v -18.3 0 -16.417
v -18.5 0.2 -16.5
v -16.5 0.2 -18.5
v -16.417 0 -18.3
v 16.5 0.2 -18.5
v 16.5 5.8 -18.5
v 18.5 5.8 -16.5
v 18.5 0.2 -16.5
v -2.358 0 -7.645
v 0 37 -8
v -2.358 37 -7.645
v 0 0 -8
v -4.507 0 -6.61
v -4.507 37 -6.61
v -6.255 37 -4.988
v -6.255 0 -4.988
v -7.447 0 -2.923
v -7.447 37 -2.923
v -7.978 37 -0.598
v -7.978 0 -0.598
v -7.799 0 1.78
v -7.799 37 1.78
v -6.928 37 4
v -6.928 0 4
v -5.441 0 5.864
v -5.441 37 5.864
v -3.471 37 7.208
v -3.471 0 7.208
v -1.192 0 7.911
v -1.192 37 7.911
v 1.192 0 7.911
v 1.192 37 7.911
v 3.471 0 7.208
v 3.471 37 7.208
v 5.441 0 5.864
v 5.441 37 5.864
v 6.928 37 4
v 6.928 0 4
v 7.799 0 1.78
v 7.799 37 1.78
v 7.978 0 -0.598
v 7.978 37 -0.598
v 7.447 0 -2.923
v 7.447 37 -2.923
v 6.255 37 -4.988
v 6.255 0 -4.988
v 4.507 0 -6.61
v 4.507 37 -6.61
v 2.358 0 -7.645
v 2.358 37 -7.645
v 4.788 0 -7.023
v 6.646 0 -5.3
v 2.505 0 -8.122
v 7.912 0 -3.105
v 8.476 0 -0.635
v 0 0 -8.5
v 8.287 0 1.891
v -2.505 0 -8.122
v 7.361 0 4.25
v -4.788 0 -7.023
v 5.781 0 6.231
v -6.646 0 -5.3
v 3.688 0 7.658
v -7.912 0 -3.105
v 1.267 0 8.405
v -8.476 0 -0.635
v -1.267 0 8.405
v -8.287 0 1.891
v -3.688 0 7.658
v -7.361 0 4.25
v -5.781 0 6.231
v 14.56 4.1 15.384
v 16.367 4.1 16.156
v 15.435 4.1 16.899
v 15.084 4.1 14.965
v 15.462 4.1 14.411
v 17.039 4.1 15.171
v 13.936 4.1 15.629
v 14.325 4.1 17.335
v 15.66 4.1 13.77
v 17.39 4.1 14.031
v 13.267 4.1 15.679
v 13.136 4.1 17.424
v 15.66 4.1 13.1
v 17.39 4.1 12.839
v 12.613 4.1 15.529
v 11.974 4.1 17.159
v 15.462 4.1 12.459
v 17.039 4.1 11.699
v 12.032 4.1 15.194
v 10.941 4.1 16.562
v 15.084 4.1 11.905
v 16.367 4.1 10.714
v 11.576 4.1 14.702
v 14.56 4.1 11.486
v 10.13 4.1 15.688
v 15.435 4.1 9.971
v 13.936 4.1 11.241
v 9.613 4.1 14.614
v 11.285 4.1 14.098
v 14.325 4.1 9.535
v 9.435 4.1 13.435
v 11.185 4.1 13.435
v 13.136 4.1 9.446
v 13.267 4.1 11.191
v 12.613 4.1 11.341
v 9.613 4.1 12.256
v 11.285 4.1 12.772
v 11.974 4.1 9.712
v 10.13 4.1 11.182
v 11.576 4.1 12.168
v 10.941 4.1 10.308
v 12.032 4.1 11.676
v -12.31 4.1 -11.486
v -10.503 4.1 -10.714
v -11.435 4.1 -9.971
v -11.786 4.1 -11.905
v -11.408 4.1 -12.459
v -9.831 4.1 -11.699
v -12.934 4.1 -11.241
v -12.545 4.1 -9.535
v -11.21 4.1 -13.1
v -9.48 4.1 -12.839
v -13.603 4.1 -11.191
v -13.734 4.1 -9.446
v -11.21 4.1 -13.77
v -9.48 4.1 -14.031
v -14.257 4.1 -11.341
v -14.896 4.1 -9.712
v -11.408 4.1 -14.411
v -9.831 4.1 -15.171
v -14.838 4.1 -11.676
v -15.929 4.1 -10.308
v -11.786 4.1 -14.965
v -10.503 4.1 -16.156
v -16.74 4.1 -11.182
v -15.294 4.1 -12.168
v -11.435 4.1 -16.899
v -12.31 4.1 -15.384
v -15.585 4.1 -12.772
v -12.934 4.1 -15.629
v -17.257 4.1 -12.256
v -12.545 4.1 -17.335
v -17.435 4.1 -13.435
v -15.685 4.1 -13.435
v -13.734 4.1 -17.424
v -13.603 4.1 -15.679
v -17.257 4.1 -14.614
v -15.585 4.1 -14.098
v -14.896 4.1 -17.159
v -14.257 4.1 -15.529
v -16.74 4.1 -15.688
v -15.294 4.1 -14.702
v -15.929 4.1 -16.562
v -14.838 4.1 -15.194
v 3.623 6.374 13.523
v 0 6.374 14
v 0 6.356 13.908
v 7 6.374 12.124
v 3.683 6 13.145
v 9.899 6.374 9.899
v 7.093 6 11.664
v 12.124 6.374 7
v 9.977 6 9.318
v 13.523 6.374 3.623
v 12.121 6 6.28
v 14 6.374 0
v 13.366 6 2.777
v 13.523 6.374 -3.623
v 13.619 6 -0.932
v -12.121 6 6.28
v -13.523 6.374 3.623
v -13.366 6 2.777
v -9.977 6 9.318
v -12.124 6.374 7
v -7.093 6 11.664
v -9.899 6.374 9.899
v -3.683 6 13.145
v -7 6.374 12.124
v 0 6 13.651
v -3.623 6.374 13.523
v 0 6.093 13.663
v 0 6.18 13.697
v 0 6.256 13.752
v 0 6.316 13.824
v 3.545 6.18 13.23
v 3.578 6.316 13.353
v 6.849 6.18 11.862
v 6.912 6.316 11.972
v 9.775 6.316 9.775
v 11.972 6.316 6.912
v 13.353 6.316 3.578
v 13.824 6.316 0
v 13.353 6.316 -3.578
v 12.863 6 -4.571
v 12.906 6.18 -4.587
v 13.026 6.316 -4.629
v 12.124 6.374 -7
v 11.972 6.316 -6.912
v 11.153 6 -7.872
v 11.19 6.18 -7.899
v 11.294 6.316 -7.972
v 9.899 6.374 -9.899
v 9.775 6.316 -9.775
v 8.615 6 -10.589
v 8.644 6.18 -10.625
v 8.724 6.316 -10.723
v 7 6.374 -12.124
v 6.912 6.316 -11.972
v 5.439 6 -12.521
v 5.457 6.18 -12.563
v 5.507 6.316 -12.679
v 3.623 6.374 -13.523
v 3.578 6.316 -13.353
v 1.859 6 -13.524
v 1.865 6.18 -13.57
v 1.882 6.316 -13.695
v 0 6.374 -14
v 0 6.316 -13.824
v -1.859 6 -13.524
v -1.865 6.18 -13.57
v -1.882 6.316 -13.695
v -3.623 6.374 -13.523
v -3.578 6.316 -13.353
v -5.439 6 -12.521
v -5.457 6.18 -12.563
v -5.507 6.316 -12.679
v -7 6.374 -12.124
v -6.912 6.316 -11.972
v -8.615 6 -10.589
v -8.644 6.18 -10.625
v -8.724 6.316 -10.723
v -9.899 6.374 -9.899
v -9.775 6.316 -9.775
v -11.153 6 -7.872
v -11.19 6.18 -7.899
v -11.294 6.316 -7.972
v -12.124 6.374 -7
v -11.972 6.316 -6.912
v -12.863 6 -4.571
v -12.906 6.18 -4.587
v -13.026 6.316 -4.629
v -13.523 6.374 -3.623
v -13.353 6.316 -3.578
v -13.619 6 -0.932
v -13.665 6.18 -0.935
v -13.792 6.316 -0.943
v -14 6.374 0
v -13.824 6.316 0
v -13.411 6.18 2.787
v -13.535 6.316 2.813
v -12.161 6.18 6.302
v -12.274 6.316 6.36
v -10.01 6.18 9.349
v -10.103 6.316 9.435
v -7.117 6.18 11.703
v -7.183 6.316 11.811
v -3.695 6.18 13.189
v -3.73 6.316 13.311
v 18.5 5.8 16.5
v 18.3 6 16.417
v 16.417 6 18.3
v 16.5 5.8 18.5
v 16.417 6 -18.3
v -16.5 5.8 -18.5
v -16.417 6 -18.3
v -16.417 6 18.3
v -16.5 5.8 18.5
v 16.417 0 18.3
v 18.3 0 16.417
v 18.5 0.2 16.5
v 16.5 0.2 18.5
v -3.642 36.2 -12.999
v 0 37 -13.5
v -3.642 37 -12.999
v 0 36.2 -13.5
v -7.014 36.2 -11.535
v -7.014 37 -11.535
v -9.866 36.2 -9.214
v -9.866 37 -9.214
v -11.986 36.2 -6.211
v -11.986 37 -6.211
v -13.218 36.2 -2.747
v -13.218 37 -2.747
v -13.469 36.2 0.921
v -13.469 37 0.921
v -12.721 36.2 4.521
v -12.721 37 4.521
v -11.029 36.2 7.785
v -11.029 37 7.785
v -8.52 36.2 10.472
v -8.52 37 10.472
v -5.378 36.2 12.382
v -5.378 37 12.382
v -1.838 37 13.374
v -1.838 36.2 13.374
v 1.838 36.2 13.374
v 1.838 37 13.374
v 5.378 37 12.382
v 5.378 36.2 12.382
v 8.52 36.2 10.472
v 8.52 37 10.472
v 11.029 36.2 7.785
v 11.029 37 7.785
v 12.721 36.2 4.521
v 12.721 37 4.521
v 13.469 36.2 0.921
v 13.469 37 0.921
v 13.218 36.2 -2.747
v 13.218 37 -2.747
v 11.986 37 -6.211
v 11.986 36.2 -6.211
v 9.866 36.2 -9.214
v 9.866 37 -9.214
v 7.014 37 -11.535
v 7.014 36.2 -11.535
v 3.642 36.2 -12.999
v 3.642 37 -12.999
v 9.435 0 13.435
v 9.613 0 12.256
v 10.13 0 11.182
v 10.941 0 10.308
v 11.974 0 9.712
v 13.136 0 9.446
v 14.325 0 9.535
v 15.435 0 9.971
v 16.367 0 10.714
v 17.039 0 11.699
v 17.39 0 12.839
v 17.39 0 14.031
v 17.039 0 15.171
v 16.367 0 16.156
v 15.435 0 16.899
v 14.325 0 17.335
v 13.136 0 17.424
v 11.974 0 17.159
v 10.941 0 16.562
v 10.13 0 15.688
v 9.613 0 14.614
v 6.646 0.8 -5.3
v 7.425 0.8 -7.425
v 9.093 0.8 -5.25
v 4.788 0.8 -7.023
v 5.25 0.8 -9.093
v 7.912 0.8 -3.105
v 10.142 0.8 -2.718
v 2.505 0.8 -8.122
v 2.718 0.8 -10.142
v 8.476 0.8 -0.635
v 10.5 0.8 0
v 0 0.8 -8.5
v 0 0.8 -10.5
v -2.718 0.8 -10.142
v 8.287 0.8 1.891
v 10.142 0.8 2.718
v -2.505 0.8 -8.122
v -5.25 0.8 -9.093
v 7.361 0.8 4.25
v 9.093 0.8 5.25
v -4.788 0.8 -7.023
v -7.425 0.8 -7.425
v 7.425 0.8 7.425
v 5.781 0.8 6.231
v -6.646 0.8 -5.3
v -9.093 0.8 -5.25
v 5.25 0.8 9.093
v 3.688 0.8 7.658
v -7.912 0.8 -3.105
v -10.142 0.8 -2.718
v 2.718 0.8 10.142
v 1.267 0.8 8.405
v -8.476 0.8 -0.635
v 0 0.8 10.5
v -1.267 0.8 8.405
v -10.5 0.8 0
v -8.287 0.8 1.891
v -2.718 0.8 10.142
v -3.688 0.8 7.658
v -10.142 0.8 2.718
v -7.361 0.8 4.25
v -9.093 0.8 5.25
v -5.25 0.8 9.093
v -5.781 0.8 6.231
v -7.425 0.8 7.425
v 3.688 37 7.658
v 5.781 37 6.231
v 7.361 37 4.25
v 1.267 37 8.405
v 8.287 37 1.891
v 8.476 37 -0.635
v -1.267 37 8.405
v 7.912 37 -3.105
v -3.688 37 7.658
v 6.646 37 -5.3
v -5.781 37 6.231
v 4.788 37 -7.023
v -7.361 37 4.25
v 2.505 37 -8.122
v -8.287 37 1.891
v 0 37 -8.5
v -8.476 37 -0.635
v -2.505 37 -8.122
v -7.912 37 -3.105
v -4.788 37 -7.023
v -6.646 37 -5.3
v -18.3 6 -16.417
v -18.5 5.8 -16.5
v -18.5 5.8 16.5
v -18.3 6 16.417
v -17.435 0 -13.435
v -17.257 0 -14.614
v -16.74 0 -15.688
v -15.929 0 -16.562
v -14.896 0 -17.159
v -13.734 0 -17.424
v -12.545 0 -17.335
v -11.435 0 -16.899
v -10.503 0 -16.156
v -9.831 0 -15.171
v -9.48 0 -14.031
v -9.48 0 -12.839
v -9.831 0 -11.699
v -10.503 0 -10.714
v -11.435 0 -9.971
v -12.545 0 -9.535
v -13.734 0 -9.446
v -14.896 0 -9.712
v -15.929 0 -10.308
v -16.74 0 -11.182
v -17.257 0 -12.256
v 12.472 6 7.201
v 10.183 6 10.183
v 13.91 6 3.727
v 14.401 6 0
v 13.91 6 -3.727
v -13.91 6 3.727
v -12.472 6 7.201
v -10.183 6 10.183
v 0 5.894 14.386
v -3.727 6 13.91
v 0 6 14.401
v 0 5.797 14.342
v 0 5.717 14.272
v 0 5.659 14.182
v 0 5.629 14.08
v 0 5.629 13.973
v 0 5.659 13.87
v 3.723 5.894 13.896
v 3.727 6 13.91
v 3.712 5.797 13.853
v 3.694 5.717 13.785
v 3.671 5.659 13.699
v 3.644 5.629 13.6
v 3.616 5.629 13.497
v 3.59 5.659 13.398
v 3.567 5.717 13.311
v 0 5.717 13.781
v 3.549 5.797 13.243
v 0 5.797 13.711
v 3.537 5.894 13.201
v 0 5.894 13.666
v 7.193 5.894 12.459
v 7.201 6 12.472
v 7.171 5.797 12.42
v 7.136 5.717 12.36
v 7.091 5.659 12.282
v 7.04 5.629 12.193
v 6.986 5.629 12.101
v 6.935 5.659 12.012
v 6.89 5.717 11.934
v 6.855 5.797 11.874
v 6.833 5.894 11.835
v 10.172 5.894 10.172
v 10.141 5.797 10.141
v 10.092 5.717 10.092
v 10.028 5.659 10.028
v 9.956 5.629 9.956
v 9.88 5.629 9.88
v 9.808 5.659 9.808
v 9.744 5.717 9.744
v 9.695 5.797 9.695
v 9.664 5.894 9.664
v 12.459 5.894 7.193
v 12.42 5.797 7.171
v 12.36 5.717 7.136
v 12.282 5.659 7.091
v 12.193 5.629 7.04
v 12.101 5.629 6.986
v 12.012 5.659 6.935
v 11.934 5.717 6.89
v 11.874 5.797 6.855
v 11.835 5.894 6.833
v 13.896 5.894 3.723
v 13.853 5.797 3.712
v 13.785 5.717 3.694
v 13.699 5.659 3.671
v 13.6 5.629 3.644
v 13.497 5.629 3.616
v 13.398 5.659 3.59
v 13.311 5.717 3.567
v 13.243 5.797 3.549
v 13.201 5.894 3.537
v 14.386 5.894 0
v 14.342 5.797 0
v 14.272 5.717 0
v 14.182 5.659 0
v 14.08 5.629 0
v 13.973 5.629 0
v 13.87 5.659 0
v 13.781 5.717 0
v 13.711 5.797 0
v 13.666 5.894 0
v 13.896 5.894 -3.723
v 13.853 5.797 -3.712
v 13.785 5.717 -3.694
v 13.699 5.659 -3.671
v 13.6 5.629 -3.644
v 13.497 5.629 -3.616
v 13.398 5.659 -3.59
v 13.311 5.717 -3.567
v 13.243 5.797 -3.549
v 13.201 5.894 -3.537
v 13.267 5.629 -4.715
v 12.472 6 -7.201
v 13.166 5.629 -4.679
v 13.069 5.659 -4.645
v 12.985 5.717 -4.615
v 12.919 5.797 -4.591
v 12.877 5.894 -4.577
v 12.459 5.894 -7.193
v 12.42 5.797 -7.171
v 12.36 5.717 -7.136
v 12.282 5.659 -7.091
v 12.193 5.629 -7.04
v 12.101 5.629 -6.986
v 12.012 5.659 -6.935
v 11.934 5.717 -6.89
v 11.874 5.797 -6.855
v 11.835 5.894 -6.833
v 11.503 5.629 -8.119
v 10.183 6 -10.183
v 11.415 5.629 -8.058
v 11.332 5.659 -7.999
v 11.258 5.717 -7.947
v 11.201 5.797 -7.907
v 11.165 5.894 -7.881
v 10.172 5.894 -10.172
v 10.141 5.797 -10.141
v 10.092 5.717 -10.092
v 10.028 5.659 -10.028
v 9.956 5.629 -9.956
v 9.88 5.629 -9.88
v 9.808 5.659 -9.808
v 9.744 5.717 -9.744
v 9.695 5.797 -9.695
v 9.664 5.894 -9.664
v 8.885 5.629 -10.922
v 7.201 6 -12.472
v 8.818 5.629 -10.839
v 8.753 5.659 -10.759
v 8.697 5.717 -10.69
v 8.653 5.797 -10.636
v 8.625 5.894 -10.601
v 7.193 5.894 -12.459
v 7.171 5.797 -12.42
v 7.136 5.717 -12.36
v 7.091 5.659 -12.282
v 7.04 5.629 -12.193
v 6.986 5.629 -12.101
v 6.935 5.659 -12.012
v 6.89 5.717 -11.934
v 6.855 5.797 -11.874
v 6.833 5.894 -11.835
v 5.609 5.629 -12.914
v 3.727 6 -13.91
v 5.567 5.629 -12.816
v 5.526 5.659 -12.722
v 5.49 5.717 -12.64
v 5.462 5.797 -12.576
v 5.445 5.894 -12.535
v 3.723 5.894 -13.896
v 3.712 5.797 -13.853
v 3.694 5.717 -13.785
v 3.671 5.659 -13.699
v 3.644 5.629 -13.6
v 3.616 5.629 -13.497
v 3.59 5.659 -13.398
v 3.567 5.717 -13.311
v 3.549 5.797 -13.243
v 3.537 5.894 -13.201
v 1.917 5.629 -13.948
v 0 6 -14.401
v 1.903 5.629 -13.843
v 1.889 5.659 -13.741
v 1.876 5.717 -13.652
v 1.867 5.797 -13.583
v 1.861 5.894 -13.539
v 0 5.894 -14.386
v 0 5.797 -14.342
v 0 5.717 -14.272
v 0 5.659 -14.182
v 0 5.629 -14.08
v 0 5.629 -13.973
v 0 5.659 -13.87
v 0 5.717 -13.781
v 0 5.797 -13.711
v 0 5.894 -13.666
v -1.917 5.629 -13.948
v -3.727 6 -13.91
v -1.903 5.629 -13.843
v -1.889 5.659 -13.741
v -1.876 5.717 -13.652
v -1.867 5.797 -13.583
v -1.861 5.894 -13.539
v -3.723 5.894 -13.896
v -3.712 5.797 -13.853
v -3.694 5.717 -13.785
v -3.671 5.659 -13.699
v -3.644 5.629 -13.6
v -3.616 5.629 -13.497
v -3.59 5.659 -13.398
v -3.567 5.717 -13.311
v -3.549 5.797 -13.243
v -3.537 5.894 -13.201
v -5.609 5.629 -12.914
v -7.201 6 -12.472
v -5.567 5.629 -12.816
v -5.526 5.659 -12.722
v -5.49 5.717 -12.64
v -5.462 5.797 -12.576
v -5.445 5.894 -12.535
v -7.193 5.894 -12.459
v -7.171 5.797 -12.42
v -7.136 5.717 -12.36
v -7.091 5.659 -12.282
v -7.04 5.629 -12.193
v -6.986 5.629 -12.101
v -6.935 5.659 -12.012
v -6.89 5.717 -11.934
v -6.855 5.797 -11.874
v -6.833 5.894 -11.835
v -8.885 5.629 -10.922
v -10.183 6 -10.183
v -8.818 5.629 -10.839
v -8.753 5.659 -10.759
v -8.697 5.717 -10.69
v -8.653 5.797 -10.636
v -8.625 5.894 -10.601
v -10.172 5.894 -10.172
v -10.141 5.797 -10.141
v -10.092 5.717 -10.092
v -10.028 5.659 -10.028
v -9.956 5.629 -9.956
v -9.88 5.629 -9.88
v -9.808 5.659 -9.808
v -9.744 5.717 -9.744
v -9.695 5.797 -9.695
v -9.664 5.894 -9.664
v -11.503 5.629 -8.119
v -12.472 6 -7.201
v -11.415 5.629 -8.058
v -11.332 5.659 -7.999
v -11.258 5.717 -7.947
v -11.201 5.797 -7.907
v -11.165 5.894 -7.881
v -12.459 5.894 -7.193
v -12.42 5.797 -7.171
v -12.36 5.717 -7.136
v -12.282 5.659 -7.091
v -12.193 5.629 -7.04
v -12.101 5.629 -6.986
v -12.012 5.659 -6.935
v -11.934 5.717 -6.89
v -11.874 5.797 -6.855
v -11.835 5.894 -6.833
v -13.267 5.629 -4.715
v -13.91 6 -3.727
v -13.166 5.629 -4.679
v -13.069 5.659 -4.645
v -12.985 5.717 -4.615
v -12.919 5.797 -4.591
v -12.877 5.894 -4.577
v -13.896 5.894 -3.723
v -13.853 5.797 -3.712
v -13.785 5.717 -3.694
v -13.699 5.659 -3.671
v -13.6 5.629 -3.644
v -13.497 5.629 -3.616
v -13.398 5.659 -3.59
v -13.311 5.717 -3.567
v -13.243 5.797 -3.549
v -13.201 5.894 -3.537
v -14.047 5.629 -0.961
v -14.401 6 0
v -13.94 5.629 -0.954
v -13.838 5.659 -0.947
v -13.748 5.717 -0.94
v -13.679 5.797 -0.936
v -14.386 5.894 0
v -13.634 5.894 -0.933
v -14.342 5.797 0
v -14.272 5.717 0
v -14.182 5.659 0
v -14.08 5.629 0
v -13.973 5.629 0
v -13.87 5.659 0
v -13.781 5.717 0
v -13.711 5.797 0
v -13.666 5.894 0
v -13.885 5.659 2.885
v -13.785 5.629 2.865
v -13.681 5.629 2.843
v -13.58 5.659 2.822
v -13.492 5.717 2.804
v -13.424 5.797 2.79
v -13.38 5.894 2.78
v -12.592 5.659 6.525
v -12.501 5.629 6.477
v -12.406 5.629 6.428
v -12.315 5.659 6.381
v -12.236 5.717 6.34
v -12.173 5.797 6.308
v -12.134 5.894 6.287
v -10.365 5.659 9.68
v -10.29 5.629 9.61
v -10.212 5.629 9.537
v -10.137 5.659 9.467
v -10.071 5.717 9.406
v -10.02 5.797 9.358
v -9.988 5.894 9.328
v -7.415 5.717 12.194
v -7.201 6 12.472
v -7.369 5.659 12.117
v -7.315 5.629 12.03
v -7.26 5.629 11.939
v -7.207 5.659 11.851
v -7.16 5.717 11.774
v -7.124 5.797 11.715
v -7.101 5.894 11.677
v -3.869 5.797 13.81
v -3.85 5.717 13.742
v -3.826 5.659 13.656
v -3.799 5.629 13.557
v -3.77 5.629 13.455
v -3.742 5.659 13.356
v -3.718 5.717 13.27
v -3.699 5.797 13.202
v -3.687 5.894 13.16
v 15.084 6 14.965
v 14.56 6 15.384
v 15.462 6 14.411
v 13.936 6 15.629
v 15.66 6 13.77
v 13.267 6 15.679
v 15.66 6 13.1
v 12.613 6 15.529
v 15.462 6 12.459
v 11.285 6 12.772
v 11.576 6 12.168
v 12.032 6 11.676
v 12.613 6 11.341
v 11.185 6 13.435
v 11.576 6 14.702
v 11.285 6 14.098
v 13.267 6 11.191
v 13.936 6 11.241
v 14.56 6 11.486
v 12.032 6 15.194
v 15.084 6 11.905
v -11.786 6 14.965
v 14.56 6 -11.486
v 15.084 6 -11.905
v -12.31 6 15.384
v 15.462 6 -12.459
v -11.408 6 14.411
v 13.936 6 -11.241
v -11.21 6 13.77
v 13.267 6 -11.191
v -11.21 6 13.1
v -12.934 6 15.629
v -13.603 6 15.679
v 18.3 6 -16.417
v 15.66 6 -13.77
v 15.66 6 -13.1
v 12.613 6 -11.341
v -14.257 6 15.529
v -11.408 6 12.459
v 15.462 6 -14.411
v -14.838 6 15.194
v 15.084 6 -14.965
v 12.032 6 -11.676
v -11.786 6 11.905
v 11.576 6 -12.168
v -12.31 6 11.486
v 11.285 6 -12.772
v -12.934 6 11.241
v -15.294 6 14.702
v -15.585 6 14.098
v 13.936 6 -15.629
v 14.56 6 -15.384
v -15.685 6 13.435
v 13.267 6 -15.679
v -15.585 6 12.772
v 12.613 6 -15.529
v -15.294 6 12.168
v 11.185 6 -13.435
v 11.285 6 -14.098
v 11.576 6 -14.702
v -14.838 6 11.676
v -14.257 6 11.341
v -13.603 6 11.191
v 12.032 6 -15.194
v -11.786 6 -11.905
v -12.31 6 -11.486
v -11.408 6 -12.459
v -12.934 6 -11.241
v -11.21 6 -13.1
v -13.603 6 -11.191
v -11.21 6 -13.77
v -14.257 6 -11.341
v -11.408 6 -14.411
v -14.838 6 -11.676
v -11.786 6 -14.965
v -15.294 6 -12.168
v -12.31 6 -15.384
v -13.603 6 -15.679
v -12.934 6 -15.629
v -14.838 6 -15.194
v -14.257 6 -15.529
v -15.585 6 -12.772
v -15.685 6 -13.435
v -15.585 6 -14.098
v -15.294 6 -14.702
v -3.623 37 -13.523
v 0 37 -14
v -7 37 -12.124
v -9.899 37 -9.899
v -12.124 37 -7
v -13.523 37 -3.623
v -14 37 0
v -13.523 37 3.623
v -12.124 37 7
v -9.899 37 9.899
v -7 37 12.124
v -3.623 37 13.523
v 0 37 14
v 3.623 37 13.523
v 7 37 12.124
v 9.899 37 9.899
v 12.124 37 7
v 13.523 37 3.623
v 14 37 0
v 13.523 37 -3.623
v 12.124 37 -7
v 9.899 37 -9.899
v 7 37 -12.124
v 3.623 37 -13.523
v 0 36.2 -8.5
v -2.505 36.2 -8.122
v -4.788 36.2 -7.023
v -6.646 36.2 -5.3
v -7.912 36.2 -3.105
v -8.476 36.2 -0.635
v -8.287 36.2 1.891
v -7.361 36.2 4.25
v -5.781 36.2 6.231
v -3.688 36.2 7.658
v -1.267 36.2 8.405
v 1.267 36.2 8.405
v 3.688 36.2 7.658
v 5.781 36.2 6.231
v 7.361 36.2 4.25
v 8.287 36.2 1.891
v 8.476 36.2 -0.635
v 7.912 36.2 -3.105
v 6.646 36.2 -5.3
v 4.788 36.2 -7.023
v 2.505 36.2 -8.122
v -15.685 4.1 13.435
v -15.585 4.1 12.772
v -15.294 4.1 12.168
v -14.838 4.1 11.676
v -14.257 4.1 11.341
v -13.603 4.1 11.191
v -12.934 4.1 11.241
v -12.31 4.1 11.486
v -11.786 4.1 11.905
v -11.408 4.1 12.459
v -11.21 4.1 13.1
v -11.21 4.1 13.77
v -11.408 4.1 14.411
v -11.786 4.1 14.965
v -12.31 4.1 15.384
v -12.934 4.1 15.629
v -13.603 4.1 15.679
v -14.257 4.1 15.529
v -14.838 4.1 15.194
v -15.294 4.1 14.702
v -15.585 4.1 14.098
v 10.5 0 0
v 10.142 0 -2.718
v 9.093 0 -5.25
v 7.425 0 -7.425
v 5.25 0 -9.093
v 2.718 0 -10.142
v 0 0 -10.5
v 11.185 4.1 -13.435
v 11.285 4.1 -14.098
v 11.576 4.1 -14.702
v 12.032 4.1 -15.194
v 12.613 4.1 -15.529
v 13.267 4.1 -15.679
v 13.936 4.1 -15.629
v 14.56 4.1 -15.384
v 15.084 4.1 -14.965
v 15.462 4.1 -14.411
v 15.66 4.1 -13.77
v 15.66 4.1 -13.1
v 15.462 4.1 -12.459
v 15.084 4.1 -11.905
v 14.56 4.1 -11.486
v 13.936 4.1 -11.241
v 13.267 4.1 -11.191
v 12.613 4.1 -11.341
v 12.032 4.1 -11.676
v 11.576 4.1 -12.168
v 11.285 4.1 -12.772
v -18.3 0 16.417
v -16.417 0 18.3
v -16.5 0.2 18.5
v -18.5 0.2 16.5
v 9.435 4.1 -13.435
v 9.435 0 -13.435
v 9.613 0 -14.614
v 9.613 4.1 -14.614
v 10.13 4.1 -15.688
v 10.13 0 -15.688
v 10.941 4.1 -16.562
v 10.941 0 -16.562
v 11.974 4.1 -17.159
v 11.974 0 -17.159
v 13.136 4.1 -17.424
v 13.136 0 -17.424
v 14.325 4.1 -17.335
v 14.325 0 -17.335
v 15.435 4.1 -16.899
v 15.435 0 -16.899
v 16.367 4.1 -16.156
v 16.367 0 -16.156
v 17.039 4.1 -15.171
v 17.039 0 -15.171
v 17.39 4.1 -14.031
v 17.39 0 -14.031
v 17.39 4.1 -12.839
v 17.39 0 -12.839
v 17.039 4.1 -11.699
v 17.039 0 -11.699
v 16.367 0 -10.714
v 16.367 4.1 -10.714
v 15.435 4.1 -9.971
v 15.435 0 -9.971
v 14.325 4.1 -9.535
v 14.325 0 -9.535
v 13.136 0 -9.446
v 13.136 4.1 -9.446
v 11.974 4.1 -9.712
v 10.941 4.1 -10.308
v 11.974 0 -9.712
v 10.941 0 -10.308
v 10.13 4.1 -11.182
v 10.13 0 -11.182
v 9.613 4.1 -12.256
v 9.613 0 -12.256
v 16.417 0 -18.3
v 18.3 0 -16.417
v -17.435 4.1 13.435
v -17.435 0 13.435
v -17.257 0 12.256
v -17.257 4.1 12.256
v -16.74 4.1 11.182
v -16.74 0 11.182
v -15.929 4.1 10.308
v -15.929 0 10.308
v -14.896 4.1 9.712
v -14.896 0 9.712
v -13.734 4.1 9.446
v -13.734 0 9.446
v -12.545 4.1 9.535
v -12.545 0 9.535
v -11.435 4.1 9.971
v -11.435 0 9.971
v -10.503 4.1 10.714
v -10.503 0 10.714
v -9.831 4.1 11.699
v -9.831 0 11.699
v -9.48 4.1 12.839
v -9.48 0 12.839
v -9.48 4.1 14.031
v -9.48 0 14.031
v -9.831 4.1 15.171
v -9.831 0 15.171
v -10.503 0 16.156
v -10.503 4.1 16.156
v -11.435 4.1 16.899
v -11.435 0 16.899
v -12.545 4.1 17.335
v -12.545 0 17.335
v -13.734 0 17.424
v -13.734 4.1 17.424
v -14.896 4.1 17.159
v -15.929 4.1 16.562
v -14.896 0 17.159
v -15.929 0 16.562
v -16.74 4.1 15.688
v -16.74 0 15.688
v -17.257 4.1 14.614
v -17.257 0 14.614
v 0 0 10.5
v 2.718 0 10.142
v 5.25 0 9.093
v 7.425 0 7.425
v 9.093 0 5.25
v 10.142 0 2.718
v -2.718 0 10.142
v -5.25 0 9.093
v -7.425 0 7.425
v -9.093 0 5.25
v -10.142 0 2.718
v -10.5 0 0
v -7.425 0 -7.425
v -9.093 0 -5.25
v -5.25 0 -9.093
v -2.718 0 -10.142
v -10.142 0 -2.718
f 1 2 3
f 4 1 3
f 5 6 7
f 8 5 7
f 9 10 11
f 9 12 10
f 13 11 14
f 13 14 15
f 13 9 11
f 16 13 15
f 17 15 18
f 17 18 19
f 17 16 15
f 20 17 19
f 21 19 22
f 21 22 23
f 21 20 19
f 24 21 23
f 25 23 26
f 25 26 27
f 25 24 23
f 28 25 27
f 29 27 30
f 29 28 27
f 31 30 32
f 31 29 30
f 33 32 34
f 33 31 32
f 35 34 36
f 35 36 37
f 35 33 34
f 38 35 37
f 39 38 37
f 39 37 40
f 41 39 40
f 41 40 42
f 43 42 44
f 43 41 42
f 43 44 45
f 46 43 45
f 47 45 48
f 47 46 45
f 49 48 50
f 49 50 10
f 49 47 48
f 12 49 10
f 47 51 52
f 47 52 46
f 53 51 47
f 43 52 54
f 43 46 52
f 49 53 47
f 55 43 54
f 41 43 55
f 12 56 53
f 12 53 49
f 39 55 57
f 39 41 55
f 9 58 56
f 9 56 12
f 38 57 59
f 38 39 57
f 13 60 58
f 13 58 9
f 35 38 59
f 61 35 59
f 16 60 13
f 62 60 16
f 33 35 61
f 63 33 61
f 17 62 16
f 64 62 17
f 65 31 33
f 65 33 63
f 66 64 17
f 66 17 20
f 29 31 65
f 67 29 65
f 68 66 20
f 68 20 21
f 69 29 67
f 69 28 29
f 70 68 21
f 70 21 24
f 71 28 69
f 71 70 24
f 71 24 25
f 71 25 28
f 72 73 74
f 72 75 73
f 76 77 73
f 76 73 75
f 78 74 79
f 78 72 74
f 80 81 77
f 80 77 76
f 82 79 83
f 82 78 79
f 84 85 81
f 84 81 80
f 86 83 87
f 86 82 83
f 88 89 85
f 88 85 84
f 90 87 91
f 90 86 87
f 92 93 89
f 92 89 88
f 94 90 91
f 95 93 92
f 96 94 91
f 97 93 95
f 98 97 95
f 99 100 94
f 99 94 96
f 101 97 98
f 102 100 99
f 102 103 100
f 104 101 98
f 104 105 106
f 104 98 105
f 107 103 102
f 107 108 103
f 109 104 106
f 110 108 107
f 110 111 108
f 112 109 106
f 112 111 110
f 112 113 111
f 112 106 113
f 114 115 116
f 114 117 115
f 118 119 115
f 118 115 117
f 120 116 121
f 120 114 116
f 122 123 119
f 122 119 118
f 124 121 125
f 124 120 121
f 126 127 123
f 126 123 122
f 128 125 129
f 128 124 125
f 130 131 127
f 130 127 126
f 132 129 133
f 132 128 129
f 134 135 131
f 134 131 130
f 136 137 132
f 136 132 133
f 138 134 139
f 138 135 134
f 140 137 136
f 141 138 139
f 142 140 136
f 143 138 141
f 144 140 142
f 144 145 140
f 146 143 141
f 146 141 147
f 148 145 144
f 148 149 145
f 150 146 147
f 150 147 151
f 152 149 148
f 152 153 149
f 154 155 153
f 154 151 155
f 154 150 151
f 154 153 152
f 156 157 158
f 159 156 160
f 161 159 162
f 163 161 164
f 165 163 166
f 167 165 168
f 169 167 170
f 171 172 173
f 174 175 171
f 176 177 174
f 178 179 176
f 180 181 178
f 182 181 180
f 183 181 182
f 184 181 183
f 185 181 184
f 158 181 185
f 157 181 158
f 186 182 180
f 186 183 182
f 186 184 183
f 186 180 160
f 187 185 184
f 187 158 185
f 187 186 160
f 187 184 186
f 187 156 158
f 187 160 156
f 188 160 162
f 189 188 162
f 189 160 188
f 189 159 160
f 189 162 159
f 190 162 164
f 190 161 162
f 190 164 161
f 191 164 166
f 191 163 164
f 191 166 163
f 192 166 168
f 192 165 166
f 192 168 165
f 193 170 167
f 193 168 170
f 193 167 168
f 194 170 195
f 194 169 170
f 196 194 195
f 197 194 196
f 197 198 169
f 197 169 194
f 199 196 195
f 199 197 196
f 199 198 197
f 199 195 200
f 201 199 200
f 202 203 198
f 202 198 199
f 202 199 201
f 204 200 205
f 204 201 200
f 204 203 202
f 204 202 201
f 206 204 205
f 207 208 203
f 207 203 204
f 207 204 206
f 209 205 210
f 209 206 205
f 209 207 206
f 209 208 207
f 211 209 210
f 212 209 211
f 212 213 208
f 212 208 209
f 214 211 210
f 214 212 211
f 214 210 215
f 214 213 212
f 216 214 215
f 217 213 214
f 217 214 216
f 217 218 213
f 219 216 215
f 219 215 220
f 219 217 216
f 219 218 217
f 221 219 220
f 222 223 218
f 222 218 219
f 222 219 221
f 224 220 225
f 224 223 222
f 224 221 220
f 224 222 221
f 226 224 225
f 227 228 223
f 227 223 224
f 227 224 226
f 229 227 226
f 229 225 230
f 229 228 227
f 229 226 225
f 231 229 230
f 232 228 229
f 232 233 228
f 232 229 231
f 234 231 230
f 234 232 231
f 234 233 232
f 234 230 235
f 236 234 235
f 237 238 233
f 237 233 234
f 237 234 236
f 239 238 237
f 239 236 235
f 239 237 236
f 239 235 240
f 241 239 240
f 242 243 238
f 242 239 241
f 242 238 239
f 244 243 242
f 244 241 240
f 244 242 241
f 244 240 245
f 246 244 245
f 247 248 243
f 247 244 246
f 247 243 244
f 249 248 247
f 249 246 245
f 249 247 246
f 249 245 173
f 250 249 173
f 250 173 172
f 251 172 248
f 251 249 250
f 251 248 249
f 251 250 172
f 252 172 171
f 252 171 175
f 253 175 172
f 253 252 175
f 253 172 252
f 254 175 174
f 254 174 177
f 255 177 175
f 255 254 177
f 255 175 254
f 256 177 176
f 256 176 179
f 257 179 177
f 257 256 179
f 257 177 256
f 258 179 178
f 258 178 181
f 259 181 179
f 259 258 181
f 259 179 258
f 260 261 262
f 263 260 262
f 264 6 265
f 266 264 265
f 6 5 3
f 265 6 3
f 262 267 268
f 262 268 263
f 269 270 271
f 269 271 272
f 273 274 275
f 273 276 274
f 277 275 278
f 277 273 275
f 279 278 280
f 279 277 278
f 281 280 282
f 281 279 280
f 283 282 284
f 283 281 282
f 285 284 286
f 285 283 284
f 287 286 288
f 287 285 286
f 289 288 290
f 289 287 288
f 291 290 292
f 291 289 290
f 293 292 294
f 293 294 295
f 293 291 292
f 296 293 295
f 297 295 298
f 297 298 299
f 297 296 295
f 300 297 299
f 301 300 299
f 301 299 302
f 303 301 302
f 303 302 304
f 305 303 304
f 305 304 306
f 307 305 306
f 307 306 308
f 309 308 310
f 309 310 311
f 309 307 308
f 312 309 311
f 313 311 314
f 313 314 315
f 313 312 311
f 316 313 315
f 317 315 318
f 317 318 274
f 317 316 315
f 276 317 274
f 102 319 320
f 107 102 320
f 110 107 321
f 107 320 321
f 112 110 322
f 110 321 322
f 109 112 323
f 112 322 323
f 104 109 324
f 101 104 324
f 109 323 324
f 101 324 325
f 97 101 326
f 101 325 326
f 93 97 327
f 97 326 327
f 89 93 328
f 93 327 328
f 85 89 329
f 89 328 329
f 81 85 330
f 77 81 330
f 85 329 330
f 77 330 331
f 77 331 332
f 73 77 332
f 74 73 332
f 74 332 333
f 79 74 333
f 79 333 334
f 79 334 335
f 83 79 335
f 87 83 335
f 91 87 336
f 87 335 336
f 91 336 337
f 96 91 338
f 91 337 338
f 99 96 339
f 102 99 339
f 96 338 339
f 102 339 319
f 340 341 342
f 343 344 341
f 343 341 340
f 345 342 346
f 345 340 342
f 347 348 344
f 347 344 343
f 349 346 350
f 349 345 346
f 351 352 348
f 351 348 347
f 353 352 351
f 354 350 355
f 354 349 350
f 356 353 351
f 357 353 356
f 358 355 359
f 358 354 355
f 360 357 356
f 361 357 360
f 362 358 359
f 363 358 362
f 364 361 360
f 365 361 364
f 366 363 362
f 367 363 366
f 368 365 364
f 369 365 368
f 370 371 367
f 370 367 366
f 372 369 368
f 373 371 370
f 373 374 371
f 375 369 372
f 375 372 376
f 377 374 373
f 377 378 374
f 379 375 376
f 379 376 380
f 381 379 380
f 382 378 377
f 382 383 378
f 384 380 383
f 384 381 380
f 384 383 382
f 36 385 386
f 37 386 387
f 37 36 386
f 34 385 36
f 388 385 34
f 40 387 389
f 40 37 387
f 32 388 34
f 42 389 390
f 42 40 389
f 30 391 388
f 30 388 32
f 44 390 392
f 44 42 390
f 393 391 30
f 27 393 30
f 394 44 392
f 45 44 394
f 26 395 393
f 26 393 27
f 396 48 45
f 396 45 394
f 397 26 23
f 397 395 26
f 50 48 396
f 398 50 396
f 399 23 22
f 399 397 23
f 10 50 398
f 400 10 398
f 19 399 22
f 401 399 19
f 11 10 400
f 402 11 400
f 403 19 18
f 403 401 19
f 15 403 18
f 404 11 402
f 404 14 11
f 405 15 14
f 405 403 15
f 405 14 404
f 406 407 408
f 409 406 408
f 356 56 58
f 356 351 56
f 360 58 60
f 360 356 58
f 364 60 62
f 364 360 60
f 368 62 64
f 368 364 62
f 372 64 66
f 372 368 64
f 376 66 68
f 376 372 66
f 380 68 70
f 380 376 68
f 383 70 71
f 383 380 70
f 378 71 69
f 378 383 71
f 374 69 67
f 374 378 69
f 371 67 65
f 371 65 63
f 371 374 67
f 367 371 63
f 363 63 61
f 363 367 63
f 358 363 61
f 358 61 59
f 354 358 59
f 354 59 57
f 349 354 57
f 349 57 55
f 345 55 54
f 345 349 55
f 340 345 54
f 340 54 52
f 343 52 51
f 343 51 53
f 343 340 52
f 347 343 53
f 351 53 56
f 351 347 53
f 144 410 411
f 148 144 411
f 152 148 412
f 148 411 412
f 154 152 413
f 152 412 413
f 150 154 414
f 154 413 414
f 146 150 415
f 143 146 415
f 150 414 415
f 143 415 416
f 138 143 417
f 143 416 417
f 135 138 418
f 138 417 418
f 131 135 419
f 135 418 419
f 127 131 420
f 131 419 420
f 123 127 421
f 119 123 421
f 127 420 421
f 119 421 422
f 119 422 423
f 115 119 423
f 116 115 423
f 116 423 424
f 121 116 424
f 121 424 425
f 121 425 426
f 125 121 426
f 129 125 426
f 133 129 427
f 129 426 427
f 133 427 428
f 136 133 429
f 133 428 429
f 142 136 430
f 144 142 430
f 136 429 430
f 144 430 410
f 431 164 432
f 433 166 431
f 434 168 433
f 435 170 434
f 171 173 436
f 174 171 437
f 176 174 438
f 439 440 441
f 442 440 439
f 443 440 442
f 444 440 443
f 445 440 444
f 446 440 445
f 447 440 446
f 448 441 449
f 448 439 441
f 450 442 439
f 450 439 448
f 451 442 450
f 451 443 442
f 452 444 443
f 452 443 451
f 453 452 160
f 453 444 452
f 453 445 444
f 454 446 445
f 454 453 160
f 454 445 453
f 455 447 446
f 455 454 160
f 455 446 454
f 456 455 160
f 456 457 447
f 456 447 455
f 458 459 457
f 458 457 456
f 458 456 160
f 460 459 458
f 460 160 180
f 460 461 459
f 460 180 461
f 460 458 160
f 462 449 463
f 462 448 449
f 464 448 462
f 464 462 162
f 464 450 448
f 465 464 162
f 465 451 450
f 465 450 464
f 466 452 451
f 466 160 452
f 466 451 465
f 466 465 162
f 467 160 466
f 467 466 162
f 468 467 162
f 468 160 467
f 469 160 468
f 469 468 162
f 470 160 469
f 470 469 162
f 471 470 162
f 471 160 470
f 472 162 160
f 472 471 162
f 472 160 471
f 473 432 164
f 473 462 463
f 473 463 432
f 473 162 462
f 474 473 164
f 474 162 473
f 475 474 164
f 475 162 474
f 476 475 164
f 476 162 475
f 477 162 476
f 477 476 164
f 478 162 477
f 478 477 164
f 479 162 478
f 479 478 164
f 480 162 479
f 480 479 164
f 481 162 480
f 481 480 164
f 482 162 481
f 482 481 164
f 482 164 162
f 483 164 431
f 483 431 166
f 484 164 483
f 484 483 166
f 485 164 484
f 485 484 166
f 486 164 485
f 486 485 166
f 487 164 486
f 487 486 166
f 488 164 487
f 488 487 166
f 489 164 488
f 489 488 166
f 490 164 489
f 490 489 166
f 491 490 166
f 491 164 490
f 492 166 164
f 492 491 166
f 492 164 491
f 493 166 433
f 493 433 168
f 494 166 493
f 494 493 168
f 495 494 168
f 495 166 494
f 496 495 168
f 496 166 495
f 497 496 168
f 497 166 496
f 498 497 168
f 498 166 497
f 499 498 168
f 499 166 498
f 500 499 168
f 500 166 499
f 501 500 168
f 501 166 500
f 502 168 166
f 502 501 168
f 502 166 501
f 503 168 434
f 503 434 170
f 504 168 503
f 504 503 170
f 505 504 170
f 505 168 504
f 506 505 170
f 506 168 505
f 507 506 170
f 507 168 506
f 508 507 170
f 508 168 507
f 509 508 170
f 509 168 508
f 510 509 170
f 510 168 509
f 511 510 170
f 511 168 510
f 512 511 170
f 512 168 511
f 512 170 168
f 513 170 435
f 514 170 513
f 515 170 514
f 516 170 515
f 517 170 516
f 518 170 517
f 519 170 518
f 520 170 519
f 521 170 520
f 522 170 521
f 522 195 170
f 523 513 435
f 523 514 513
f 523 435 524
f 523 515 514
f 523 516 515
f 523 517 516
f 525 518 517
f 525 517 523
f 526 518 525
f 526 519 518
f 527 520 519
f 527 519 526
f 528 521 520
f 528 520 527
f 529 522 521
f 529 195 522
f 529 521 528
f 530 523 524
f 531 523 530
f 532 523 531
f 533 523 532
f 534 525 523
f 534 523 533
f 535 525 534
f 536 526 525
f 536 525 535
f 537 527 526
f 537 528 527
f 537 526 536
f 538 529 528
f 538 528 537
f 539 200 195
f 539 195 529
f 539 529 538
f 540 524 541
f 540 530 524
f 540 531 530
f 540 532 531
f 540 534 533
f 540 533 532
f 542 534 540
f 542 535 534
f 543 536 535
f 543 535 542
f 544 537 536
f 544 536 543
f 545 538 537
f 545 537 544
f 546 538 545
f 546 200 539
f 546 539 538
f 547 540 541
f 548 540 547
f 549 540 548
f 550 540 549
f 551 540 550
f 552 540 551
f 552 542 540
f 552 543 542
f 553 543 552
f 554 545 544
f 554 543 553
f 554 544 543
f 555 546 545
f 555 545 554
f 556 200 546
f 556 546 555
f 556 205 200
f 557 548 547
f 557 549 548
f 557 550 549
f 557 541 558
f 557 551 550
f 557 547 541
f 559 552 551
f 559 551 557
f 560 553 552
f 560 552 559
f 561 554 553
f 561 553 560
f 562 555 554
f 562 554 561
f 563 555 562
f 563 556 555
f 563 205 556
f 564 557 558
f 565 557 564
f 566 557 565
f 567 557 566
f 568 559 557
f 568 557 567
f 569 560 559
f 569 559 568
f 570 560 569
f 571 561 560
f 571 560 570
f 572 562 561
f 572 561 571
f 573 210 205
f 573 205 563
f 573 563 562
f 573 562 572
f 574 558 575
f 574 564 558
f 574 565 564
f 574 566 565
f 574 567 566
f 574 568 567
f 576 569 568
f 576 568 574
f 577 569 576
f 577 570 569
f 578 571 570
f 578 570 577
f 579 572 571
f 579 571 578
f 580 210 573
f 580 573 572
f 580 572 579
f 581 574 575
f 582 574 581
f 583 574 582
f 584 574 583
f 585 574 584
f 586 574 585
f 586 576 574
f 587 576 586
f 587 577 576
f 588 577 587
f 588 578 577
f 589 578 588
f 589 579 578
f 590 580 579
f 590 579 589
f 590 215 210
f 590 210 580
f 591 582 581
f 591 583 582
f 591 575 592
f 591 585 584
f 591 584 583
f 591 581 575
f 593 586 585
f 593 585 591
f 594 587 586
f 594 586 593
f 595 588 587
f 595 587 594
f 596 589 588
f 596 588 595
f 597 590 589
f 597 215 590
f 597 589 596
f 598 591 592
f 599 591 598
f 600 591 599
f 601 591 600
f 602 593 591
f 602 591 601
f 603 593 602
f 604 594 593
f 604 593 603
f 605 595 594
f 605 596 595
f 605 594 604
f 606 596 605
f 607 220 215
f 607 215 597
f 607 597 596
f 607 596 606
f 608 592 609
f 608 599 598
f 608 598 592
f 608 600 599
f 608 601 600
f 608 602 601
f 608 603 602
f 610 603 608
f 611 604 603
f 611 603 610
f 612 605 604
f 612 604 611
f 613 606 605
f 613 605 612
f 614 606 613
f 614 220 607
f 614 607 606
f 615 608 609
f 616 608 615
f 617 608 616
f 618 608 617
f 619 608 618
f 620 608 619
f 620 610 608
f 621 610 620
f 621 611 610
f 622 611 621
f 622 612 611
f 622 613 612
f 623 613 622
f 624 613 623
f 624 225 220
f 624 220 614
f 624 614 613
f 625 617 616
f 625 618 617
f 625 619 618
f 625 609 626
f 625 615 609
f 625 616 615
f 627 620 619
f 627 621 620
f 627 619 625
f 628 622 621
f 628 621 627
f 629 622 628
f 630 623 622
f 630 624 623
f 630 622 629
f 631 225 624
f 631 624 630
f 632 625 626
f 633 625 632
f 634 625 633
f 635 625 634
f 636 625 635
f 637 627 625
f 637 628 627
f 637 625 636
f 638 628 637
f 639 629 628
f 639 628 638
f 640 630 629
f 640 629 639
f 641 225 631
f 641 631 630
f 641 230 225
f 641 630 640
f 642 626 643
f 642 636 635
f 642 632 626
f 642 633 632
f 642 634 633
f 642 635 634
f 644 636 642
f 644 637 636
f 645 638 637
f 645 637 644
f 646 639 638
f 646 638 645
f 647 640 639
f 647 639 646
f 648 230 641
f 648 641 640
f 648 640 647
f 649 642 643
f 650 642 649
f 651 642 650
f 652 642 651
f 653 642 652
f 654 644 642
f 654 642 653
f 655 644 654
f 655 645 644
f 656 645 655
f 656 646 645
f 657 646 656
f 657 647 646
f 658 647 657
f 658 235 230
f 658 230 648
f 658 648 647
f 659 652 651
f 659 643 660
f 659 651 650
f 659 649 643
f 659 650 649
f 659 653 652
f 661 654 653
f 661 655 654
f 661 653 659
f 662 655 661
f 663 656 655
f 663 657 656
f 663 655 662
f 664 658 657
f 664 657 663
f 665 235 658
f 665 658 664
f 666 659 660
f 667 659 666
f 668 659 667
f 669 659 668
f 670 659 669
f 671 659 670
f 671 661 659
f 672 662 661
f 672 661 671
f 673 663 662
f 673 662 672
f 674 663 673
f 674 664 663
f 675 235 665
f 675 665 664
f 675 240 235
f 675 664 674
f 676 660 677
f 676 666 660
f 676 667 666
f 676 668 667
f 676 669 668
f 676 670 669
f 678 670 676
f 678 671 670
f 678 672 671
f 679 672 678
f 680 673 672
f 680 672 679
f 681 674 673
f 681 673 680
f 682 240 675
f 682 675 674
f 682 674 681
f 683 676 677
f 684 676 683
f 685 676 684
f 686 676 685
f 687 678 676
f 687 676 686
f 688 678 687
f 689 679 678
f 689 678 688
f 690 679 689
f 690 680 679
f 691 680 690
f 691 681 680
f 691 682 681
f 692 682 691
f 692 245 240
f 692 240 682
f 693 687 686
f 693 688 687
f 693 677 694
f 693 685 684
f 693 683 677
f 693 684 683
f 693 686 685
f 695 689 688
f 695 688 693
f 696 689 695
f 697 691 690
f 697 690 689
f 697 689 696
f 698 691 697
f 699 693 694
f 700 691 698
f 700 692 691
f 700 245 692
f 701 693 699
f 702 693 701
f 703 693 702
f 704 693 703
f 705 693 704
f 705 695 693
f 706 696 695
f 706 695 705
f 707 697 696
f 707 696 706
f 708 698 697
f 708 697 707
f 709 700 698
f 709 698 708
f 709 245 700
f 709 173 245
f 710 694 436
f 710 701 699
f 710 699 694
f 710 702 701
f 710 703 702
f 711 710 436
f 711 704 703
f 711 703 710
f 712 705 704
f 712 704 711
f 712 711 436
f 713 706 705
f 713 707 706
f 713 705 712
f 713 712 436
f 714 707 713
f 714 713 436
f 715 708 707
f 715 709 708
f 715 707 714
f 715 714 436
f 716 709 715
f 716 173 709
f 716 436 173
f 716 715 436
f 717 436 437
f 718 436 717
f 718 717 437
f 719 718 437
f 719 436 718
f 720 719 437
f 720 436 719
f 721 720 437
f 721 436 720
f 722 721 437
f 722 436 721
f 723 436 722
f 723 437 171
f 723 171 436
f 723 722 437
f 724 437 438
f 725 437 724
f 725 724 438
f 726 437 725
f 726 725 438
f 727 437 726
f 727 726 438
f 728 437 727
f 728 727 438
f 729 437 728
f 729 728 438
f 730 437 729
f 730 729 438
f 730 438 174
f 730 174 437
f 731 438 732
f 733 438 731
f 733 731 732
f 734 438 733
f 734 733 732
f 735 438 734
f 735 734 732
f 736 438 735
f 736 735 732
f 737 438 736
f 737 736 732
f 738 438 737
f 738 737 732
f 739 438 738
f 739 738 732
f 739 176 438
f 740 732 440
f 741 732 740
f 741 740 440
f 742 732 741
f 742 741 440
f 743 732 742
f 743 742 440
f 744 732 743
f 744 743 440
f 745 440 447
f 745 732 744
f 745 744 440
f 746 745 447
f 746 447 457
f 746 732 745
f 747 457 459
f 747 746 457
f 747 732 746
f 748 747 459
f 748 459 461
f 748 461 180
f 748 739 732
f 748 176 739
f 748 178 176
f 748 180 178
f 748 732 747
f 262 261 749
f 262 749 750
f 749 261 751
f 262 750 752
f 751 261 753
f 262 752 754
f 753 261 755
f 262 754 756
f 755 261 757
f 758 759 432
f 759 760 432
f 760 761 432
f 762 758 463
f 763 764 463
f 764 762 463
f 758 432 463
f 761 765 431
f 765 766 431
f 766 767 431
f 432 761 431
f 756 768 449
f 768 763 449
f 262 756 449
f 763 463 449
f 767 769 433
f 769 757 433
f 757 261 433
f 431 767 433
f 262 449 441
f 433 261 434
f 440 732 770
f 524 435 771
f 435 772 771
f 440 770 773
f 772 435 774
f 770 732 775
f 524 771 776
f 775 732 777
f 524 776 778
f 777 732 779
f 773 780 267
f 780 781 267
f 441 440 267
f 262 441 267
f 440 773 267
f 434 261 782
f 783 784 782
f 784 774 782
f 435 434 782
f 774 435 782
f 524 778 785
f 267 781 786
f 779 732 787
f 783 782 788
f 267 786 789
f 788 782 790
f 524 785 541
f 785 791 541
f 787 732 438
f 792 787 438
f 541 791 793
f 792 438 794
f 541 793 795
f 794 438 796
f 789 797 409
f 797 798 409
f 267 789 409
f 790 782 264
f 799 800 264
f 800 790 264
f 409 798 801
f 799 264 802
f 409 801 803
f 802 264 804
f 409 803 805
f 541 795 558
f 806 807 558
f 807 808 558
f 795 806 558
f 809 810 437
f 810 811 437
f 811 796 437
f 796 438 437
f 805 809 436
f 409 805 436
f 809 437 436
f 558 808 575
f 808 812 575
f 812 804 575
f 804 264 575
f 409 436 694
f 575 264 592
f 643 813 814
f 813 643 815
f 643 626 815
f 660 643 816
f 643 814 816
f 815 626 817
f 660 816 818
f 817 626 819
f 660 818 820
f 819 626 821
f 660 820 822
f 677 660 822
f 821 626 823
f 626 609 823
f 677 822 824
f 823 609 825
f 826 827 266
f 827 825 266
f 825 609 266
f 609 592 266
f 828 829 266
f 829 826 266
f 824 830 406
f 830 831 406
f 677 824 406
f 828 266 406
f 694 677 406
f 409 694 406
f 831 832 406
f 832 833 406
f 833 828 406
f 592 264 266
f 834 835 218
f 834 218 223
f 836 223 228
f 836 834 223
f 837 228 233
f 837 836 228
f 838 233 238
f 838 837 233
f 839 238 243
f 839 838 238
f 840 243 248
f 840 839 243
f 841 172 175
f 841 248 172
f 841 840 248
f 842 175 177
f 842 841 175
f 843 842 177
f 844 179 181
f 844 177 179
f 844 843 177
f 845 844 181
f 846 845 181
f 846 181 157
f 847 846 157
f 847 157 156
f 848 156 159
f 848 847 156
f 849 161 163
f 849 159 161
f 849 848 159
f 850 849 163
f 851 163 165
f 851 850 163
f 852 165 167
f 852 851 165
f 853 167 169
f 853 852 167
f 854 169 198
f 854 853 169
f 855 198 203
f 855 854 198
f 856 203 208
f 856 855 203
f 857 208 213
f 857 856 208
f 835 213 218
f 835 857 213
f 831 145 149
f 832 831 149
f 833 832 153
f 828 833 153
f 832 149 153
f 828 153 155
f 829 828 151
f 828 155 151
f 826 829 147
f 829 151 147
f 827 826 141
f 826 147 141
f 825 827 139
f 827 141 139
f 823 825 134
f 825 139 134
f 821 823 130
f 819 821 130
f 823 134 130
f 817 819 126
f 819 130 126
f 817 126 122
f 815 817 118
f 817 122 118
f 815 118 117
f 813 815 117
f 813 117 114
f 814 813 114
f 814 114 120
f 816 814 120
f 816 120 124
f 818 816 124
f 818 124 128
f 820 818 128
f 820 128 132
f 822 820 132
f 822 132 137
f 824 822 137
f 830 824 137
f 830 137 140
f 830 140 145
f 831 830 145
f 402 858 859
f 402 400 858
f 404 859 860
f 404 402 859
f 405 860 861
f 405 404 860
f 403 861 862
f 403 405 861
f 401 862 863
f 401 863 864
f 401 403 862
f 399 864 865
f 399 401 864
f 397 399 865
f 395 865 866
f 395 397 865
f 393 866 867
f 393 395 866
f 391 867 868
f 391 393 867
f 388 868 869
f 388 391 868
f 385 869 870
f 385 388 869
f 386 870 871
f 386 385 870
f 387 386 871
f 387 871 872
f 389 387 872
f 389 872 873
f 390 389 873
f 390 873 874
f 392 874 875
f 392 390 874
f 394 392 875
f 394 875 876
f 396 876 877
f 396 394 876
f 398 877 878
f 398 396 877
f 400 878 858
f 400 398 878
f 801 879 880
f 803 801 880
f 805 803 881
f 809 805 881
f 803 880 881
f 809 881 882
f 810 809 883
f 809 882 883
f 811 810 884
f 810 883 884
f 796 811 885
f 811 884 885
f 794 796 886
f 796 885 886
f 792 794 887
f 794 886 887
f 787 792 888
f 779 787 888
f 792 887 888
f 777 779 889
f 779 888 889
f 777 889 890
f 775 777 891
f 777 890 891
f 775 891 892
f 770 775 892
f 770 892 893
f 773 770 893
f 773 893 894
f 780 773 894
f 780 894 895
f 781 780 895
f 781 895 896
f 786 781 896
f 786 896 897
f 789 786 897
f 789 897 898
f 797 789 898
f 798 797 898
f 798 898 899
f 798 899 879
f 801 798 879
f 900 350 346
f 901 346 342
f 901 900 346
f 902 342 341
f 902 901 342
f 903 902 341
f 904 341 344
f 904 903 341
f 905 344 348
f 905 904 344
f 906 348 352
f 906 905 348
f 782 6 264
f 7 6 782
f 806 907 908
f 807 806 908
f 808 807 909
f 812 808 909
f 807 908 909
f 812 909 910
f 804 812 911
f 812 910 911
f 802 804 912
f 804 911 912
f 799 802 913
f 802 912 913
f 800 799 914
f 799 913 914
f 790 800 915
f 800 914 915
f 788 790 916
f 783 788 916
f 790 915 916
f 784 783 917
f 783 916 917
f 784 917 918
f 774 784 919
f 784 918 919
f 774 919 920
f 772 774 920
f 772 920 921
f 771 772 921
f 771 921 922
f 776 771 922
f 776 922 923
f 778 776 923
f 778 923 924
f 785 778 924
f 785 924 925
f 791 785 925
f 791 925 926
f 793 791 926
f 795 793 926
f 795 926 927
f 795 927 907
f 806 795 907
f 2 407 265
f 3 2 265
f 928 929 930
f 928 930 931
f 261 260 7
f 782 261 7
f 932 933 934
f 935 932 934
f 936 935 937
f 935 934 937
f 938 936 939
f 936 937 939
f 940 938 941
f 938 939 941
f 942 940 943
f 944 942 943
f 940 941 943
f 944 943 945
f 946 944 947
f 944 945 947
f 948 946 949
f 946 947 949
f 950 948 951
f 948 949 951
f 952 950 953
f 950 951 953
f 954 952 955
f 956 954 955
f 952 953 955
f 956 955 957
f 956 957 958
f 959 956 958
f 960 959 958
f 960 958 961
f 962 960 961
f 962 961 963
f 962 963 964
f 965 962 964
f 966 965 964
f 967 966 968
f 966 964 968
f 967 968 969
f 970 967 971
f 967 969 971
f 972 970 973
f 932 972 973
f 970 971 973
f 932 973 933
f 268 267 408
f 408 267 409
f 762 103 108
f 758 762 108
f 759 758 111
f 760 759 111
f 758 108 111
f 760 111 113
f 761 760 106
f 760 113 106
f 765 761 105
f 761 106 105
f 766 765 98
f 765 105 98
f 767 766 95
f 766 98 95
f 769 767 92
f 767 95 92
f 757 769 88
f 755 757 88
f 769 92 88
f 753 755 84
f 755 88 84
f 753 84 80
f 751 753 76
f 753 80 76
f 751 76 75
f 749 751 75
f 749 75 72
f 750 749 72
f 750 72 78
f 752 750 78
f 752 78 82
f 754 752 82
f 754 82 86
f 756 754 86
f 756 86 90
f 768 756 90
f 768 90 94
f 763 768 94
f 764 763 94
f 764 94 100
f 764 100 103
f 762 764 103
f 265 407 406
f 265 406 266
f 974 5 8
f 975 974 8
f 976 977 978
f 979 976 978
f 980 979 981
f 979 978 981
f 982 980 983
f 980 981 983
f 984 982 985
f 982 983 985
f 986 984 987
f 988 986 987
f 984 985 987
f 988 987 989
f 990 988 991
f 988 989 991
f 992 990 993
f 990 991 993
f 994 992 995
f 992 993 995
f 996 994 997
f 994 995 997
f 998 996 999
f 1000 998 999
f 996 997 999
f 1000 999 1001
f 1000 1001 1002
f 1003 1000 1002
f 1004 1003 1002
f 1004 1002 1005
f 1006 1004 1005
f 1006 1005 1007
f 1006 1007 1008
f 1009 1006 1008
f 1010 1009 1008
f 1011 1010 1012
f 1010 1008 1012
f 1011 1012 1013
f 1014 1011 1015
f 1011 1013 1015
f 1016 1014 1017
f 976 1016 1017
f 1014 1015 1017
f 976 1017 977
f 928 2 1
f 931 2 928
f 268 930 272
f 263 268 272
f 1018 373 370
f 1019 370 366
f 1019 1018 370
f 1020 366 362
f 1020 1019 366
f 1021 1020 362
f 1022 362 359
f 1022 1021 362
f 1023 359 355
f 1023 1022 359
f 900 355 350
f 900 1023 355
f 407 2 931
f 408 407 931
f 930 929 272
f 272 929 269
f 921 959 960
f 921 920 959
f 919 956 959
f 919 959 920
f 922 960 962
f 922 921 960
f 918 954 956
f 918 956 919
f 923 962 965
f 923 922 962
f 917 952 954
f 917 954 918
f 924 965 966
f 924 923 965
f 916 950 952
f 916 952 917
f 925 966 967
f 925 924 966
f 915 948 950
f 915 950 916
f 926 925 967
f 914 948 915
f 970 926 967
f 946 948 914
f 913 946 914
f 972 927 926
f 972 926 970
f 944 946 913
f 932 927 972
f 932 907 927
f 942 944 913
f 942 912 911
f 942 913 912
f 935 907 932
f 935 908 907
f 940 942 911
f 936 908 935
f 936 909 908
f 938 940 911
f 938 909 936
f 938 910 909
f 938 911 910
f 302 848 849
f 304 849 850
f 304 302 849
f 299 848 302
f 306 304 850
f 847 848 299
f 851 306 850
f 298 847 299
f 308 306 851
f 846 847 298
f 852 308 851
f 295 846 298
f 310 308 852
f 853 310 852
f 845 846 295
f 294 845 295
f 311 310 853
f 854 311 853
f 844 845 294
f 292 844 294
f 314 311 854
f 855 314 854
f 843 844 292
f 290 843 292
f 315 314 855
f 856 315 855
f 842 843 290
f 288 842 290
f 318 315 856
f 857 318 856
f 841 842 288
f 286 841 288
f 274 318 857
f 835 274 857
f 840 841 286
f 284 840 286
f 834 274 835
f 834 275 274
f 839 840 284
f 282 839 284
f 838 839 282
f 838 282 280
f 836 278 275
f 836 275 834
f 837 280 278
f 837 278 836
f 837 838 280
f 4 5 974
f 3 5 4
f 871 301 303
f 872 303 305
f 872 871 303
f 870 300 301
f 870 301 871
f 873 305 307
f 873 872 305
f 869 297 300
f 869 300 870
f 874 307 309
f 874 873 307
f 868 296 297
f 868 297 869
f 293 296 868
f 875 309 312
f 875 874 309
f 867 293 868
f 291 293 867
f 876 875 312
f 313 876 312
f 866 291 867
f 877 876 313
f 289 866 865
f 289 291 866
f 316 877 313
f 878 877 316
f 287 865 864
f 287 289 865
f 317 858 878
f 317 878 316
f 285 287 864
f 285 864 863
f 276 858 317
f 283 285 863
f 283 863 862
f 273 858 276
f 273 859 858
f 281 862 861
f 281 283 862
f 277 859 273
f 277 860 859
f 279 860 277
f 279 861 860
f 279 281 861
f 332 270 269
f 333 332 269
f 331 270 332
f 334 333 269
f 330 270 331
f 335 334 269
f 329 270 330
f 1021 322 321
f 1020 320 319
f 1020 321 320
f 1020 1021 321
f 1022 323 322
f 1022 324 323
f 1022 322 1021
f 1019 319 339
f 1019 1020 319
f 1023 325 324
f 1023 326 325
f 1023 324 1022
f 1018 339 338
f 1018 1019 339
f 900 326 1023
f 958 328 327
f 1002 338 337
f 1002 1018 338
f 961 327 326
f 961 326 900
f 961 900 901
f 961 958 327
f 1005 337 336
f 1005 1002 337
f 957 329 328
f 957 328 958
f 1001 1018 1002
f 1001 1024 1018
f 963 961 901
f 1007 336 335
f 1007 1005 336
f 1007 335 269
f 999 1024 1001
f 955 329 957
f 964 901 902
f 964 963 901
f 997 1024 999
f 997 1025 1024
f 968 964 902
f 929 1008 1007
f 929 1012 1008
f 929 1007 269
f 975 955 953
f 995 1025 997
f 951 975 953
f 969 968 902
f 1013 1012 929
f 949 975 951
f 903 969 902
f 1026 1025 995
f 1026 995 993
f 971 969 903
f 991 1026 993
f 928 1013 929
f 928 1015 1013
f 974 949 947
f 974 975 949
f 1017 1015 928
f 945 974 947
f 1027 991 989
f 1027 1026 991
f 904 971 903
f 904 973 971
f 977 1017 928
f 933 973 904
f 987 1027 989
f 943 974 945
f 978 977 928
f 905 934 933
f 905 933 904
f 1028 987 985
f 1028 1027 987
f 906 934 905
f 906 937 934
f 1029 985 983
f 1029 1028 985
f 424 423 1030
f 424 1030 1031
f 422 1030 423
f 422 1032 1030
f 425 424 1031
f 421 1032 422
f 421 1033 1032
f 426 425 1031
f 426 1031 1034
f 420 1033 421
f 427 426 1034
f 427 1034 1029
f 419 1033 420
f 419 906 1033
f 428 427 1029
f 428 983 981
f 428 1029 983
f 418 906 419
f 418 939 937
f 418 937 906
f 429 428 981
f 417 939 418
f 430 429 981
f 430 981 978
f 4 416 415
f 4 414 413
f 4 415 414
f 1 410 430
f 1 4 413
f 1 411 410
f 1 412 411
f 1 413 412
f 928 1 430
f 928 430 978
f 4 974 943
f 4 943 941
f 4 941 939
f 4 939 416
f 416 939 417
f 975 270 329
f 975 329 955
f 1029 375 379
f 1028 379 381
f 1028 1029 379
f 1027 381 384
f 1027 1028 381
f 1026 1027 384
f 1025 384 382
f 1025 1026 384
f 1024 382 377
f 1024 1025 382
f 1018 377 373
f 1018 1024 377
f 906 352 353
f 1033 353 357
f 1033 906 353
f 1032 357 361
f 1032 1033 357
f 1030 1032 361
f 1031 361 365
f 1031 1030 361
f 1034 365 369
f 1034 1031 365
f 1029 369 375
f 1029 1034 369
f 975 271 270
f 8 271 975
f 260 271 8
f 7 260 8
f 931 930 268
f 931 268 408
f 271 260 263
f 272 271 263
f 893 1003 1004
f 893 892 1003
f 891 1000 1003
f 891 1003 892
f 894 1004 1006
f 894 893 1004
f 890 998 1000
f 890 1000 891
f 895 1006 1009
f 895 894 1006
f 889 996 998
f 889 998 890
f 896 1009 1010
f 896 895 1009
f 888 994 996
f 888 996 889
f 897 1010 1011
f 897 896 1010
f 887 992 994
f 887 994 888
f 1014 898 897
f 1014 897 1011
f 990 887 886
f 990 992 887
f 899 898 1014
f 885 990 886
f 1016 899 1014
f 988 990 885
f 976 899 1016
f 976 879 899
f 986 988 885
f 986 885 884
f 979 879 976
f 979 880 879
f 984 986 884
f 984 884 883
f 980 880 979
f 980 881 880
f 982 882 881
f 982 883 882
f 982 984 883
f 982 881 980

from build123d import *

# Parameters (mm, degrees)
FLANGE_DEPTH         = 6
SKETCH9_R            = 4
COUNTERBORE_DEPTH    = 4.1
SKETCH10_R           = 2.25
MOUNTING_HOLES_DEPTH = 33.9
SKETCH11_R           = 0.375
CHAMFER1_SIZE        = 0.2


with BuildPart() as part:
    # Sketch5 → Bearing Body (revolve)
    with BuildSketch(Plane(origin=(0, 0, 0), x_dir=(0, 0, -1), z_dir=(1, 0, 0))):
        Polygon((8.5, 37), (8, 37), (8, 0), (8.5, 0), (8.5, 0.8), (13.5, 0.8), (13.5, 0), (14, 0), (14, 37), (13.5, 37), (13.5, 36.2), (8.5, 36.2), align=None)
    revolve(axis=Axis((0, 0, 0), (0, 1, 0)))

    # Sketch8 → Flange (add)
    with BuildSketch(Plane(origin=(0, 0, 0), x_dir=(1, 0, 0), z_dir=(0, 1, 0))):
        Polygon((0, -18.5), (-16.5, -18.5), (-18.5, -16.5), (-18.5, 0), (-18.5, 16.5), (-16.5, 18.5), (0, 18.5), (16.5, 18.5), (18.5, 16.5), (18.5, 0), (18.5, -16.5), (16.5, -18.5), align=None)
        with BuildLine():
            ThreePointArc((-10.5, 0), (-7.424621202, -7.424621202), (0, -10.5))
            ThreePointArc((0, -10.5), (7.424621202, -7.424621202), (10.5, 0))
            ThreePointArc((10.5, 0), (7.424621202, 7.424621202), (0, 10.5))
            ThreePointArc((0, 10.5), (-7.424621202, 7.424621202), (-10.5, 0))
        make_face(mode=Mode.SUBTRACT)
    extrude(amount=FLANGE_DEPTH)

    # Sketch9 → Counterbore (cut)
    with BuildSketch(Plane(origin=(0, 0, 0), x_dir=(-1, 0, 0), z_dir=(0, -1, 0))):
        with Locations((13.435028843, -13.435028843)):
            Circle(SKETCH9_R)
        with Locations((-13.435028843, -13.435028843)):
            Circle(SKETCH9_R)
        with Locations((-13.435028843, 13.435028843)):
            Circle(SKETCH9_R)
        with Locations((13.435028843, 13.435028843)):
            Circle(SKETCH9_R)
    extrude(amount=-COUNTERBORE_DEPTH, mode=Mode.SUBTRACT)

    # Sketch10 → Mounting Holes (cut, through all)
    with BuildSketch(Plane(origin=(0, 4.1, 0), x_dir=(-1, 0, 0), z_dir=(0, -1, 0))):
        with Locations((13.435028843, 13.435028843)):
            Circle(SKETCH10_R)
        with Locations((13.435028843, -13.435028843)):
            Circle(SKETCH10_R)
        with Locations((-13.435028843, -13.435028843)):
            Circle(SKETCH10_R)
        with Locations((-13.435028843, 13.435028843)):
            Circle(SKETCH10_R)
    extrude(amount=-MOUNTING_HOLES_DEPTH, mode=Mode.SUBTRACT)

    # Sketch11 → Relief (revolve, cut)
    with BuildSketch(Plane(origin=(0, 0, 0), x_dir=(0, 0, -1), z_dir=(1, 0, 0))):
        with Locations((-14.026134699, 6)):
            Circle(SKETCH11_R)
    revolve(axis=Axis((0, 0, 0), (0, 1, 0)), mode=Mode.SUBTRACT)

    # Chamfer1
    chamfer1_edges = [part.edges().sort_by_distance(p)[0] for p in [
        (-17.5, 6, 17.5),
        (0, 6, 18.5),
        (17.5, 6, 17.5),
        (18.5, 6, 0),
        (17.5, 6, -17.5),
        (0, 6, -18.5),
        (-17.5, 6, -17.5),
        (-18.5, 6, 0),
        (-17.5, 0, 17.5),
        (0, 0, 18.5),
        (17.5, 0, 17.5),
        (18.5, 0, 0),
        (17.5, 0, -17.5),
        (0, 0, -18.5),
        (-17.5, 0, -17.5),
        (-18.5, 0, 0),
    ]]
    chamfer(chamfer1_edges, length=CHAMFER1_SIZE)


solid = part.part
